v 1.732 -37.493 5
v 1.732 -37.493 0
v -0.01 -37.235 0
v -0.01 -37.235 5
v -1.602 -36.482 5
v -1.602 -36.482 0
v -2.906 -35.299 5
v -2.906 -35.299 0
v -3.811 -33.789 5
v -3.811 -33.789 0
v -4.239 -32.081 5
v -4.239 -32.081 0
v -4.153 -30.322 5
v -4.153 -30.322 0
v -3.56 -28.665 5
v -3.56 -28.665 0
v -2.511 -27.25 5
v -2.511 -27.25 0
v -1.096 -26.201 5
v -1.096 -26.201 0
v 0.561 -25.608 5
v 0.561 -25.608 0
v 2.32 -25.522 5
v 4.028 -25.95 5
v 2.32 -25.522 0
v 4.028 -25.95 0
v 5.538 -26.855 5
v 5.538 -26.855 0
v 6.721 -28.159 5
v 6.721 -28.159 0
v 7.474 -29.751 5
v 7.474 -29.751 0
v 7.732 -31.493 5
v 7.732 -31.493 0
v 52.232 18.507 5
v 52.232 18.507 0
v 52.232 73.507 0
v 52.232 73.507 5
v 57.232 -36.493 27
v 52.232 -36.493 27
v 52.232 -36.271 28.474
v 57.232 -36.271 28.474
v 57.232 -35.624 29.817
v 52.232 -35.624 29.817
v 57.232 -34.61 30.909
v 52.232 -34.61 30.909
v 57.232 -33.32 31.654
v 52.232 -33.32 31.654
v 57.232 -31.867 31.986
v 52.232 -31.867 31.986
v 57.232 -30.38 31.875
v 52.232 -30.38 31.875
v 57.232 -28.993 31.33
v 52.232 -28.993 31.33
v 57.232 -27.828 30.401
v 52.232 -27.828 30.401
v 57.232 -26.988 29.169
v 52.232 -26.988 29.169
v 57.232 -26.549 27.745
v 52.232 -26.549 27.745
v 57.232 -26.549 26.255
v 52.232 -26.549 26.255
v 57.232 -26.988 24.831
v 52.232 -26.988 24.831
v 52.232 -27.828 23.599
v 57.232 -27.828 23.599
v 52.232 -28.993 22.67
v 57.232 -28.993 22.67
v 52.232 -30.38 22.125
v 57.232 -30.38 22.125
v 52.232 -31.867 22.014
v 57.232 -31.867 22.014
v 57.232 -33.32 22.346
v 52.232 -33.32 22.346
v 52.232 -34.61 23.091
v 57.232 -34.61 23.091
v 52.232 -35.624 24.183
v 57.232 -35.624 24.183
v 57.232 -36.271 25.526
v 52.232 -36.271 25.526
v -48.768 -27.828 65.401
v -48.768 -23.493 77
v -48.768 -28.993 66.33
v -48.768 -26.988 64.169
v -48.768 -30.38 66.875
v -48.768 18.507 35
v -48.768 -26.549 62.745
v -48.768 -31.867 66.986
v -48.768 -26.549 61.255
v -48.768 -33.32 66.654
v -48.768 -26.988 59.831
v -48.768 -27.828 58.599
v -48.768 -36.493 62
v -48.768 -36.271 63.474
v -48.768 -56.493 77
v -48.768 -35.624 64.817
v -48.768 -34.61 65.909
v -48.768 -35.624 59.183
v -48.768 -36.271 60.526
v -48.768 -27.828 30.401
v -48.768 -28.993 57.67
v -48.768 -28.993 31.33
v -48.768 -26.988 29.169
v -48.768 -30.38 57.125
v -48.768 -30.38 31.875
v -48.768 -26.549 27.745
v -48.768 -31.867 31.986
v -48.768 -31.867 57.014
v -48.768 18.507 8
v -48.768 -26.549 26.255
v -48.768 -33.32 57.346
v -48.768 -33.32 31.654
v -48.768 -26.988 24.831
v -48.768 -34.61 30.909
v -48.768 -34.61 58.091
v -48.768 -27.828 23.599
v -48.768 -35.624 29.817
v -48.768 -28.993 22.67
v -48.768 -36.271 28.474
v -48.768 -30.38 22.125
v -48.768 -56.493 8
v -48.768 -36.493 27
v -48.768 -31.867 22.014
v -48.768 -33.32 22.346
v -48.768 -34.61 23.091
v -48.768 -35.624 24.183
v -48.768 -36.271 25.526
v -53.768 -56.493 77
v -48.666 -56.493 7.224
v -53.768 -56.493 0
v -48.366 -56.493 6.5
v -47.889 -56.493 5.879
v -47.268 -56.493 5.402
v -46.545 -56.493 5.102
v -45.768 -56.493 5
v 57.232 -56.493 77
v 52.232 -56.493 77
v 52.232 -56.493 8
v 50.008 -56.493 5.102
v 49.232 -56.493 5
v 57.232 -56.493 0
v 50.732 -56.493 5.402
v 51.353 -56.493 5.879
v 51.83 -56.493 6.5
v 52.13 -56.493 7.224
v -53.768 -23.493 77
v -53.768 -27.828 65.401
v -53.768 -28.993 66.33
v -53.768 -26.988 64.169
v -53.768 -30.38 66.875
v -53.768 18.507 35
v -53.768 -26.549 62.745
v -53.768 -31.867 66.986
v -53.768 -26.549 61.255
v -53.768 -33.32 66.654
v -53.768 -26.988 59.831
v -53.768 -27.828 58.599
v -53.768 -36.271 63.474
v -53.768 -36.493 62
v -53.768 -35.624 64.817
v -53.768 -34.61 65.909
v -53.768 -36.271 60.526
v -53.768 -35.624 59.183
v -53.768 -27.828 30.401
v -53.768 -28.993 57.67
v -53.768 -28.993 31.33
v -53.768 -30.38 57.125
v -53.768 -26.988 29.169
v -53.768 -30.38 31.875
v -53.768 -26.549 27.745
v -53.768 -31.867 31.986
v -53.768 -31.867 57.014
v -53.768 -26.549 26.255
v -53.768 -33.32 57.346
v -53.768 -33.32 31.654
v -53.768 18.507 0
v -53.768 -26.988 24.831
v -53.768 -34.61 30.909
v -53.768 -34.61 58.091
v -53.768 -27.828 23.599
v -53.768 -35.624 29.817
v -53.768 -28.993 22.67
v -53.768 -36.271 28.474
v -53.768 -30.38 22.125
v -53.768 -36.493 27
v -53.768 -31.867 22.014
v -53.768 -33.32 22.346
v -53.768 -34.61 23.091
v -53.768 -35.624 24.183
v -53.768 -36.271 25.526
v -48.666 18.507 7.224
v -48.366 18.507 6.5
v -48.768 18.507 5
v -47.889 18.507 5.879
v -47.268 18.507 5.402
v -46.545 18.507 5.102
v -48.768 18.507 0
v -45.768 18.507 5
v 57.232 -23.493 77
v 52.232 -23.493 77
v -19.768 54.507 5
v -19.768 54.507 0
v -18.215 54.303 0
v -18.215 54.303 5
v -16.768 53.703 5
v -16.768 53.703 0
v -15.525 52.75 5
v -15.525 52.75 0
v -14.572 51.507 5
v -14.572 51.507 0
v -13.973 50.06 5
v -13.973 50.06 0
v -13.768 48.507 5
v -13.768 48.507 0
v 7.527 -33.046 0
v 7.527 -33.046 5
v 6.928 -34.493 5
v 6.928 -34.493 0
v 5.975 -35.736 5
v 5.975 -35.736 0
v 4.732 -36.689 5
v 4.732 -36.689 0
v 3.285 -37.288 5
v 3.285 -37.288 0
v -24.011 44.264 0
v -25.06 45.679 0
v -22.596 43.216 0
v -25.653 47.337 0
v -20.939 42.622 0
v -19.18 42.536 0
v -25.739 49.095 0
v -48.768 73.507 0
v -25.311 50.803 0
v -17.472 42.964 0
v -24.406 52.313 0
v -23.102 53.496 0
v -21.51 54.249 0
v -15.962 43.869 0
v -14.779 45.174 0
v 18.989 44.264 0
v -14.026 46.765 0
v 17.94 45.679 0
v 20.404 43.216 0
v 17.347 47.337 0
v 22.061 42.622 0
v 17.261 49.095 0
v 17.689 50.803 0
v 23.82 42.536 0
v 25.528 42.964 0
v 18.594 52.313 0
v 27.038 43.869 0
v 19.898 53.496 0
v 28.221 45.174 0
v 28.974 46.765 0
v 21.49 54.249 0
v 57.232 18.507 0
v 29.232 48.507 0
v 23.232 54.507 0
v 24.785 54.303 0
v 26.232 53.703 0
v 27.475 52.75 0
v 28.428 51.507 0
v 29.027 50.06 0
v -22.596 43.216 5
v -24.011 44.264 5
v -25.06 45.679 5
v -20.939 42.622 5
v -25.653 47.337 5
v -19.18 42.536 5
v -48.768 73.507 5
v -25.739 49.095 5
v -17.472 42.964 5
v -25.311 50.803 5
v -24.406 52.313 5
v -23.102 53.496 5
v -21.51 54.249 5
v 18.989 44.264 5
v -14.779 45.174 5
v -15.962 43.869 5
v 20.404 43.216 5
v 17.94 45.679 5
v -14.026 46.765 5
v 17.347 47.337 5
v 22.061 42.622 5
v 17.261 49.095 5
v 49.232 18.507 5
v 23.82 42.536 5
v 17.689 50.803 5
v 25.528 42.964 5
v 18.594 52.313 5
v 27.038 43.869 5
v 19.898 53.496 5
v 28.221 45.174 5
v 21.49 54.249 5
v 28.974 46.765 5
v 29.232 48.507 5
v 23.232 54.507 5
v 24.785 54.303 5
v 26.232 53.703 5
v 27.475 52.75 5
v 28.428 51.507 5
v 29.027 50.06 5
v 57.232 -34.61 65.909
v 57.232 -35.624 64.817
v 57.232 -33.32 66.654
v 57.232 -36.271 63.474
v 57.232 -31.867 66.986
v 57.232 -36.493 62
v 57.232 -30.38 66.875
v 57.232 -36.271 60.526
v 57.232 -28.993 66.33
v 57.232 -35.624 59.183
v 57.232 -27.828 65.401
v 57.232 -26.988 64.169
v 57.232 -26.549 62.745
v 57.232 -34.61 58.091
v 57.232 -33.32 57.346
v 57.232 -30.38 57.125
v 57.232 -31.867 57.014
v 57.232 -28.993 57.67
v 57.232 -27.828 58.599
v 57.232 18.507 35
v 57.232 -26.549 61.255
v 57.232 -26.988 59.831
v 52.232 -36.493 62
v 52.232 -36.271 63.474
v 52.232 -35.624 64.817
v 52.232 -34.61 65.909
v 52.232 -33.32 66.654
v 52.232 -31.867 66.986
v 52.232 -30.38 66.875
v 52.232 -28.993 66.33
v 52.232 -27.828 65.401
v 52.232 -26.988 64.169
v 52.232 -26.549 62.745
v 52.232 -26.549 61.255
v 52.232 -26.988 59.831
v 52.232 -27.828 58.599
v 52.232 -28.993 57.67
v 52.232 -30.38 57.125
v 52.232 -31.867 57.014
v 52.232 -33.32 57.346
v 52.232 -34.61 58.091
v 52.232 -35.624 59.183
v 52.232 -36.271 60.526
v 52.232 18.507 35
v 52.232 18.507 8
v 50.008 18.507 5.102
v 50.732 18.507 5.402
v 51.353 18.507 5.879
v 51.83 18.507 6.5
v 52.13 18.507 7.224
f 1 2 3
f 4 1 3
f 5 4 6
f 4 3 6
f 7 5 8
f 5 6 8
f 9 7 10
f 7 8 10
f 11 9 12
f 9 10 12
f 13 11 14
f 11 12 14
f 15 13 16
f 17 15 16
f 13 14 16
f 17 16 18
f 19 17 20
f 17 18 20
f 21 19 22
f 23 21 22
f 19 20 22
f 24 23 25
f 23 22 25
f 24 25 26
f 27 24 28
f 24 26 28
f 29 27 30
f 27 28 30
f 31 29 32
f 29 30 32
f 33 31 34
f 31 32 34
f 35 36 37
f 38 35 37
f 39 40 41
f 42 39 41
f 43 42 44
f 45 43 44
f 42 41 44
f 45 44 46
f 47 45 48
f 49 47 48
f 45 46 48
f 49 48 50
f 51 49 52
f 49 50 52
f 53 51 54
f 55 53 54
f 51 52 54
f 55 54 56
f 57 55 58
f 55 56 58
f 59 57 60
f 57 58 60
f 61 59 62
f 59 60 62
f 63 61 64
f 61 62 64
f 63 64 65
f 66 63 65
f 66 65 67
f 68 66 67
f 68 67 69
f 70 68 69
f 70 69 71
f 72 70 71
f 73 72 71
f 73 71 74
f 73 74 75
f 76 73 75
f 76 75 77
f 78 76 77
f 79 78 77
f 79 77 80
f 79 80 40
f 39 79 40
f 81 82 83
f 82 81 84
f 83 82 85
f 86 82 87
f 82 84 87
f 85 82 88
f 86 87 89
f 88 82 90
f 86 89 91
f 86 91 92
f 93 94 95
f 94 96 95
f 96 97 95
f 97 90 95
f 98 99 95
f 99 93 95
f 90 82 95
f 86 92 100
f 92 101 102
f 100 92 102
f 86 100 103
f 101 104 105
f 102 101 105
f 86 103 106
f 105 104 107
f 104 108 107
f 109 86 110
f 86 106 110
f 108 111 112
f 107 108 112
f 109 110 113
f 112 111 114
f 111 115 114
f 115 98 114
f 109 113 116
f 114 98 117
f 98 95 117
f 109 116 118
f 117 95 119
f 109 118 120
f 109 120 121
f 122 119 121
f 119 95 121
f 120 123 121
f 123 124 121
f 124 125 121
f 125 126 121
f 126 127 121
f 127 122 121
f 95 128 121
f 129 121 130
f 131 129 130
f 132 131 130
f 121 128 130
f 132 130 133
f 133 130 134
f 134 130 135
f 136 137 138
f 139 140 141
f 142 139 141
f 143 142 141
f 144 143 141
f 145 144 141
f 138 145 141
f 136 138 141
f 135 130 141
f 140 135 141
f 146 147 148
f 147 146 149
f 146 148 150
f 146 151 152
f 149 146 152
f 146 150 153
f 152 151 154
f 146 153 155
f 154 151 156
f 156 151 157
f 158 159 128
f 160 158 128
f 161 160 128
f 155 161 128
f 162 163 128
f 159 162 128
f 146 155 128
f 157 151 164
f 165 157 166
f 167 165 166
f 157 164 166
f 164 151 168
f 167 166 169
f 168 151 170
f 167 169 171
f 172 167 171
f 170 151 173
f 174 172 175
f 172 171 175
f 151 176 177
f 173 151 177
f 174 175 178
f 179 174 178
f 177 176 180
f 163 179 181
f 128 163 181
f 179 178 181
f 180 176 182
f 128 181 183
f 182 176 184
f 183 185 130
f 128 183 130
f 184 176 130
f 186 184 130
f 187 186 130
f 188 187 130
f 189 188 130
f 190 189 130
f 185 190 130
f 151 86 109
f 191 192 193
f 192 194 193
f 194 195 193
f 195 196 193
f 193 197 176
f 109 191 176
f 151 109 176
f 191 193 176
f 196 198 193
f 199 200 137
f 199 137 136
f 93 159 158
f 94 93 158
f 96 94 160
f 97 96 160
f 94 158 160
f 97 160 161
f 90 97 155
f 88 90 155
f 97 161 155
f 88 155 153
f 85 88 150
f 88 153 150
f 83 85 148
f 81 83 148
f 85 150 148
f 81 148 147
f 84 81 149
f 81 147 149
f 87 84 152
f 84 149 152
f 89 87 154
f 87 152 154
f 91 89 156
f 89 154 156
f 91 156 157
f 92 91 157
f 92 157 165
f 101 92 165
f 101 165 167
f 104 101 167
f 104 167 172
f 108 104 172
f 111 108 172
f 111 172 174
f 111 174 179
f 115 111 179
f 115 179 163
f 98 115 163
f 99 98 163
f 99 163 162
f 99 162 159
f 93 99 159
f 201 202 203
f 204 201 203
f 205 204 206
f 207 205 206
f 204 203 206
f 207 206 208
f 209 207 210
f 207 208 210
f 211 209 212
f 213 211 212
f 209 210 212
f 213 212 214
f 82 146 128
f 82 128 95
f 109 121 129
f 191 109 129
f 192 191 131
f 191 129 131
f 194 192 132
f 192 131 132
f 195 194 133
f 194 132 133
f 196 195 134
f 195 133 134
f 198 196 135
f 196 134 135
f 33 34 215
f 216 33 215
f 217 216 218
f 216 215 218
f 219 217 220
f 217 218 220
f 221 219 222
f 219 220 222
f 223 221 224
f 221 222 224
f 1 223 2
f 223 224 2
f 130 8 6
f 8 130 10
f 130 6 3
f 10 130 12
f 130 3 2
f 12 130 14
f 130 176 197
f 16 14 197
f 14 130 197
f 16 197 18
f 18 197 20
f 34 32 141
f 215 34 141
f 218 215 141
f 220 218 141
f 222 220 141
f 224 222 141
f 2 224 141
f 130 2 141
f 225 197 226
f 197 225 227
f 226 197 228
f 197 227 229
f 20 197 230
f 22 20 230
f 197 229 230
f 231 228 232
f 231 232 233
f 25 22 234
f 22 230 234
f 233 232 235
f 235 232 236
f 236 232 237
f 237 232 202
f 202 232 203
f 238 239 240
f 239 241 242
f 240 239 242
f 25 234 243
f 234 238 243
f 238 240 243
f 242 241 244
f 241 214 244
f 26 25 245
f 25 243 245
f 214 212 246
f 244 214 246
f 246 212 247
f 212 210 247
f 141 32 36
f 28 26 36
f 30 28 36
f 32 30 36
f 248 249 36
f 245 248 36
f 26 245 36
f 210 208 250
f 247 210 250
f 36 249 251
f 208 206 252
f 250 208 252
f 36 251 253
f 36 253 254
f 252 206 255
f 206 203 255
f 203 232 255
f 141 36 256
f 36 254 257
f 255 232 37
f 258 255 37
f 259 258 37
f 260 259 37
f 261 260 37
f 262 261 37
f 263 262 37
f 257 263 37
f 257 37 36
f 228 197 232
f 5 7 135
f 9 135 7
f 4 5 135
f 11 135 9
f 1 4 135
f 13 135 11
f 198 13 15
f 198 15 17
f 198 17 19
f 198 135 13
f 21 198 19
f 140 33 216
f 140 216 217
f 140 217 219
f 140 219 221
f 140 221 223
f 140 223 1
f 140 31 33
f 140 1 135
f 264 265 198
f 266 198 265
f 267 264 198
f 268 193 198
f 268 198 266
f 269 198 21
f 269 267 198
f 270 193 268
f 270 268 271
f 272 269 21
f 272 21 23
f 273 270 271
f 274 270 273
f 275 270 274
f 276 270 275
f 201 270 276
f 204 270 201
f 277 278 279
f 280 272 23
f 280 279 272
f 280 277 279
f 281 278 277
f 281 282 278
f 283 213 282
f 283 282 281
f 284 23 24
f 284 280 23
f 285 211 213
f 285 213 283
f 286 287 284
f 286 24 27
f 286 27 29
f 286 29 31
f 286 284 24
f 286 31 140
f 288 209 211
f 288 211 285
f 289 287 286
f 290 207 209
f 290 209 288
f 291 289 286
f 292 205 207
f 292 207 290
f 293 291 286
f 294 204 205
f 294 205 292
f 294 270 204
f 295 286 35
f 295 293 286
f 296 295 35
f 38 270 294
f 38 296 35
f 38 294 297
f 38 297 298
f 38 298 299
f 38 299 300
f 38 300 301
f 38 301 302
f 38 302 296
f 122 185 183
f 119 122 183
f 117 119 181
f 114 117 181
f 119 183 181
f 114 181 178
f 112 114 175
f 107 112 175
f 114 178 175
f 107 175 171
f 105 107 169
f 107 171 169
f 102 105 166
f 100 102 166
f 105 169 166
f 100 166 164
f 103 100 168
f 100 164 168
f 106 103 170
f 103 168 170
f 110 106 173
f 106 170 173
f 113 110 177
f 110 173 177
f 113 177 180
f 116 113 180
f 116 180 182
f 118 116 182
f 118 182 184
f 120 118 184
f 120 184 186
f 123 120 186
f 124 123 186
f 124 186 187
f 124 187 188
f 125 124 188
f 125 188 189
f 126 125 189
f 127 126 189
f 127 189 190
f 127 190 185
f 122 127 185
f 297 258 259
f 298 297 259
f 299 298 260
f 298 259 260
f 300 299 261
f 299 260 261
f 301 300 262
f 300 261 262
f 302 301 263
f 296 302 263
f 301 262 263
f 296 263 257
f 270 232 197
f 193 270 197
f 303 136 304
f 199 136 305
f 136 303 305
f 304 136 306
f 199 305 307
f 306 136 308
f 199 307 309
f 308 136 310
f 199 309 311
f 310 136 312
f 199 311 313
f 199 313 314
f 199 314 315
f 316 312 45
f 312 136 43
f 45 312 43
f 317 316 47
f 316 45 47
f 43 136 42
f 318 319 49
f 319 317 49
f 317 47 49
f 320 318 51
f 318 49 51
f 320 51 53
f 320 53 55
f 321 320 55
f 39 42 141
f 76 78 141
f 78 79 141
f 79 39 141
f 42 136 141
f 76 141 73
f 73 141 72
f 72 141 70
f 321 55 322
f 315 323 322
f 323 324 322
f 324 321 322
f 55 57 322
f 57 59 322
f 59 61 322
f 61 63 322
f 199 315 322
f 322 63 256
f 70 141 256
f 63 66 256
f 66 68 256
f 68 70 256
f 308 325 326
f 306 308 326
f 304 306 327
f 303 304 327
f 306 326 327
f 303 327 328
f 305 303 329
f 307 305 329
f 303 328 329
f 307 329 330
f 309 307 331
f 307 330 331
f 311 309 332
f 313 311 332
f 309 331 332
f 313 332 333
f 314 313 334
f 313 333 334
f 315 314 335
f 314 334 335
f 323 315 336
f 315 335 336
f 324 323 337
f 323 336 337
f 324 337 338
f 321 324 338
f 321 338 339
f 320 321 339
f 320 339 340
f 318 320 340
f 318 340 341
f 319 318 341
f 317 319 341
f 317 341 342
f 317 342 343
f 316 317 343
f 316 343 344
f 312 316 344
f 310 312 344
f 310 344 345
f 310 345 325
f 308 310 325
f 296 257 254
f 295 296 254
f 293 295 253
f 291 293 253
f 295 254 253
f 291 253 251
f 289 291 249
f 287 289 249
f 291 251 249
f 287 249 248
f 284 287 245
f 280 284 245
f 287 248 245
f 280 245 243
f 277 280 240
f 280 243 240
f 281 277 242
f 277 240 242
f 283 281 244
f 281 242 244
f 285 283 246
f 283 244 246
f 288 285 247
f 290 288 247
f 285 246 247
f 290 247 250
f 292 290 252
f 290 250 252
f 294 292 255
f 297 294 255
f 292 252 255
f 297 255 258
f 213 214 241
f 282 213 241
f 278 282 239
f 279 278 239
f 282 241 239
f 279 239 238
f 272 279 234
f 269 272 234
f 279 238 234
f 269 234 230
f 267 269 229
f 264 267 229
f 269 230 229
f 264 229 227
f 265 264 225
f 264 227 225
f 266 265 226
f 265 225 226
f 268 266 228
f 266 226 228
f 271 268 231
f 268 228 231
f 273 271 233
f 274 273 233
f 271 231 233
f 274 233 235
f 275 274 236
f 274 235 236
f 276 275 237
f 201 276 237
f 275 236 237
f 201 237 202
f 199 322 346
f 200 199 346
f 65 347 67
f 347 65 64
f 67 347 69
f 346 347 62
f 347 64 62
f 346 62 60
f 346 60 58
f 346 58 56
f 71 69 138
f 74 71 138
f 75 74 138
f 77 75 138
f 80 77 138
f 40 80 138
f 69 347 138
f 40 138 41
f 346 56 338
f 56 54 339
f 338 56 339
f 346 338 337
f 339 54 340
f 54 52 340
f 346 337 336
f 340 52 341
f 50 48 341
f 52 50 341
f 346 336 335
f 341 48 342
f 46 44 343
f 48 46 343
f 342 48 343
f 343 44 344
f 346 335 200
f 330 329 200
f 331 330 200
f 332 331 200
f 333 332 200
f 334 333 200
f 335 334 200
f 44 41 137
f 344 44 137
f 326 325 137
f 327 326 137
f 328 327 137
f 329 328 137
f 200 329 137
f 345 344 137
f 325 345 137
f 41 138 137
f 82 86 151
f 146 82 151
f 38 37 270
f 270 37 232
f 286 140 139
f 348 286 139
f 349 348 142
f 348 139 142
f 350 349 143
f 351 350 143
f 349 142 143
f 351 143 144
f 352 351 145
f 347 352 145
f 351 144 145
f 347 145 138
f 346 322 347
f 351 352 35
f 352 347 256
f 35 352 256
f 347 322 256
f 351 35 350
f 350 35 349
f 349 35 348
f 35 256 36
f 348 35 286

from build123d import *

# Parameters (mm, degrees)
F1_DEPTH = 77
F2_DEPTH = 5
F3_SIZE  = 42
F4_R     = 5
F5_DEPTH = 1000
F7_DEPTH = 10000


with BuildPart() as f1:
    # F0 (on Top) → F1 (new body)
    with BuildSketch(Plane.XY):
        Polygon((-53.768117, 18.507083), (-53.768117, -56.492917), (1.731883, -56.492917), (57.231883, -56.492917), (57.231883, -30.815218), (57.231883, 18.507083), (52.231883, 18.507083), (-48.768117, 18.507083), align=None)
        with BuildLine():
            ThreePointArc((7.731883, -31.492917), (5.974524, -35.735557), (1.731883, -37.492917))
            ThreePointArc((1.731883, -37.492917), (-2.510758, -27.250276), (7.731883, -31.492917))
        make_face(mode=Mode.SUBTRACT)
    extrude(amount=F1_DEPTH)

    # F0 (on Top) → F2 (join)
    with BuildSketch(Plane.XY):
        Polygon((-48.768117, 73.507083), (-48.768117, 18.507083), (52.231883, 18.507083), (52.231883, 73.507083), (23.231883, 73.507083), (-19.768117, 73.507083), align=None)
        with BuildLine():
            ThreePointArc((-13.768117, 48.507083), (-24.010758, 44.264443), (-19.768117, 54.507083))
            ThreePointArc((-19.768117, 54.507083), (-15.525476, 52.749724), (-13.768117, 48.507083))
        make_face(mode=Mode.SUBTRACT)
        with BuildLine():
            ThreePointArc((29.231883, 48.507083), (18.989242, 44.264443), (23.231883, 54.507083))
            ThreePointArc((23.231883, 54.507083), (27.474524, 52.749724), (29.231883, 48.507083))
        make_face(mode=Mode.SUBTRACT)
    extrude(amount=F2_DEPTH)

    # F3
    f3_edges = [f1.edges().sort_by_distance(p)[0] for p in [
        (1.731883, 18.507083, 77),
    ]]
    chamfer(f3_edges, length=F3_SIZE)

    # F4 (on face) → F5 (cut)
    with BuildSketch(Plane(origin=(-53.768117, 0, 0), x_dir=(0, -1, 0), z_dir=(-1, 0, 0))):
        with Locations((31.492917, 27)):
            Circle(F4_R)
        with Locations((31.492917, 62)):
            Circle(F4_R)
    extrude(amount=-F5_DEPTH, mode=Mode.SUBTRACT)

    # F6 (on face) → F7 (cut)
    with BuildSketch(Plane.XZ.offset(56.492917)):
        with BuildLine():
            Line((52.231883, 77), (-48.768117, 77))
            Line((-48.768117, 77), (-48.768117, 8))
            ThreePointArc((-48.768117, 8), (-47.889437, 5.87868), (-45.768117, 5))
            Line((-45.768117, 5), (49.231883, 5))
            ThreePointArc((49.231883, 5), (51.353203, 5.87868), (52.231883, 8))
            Line((52.231883, 8), (52.231883, 77))
        make_face()
    extrude(amount=-F7_DEPTH, mode=Mode.SUBTRACT)


solid = f1.part
